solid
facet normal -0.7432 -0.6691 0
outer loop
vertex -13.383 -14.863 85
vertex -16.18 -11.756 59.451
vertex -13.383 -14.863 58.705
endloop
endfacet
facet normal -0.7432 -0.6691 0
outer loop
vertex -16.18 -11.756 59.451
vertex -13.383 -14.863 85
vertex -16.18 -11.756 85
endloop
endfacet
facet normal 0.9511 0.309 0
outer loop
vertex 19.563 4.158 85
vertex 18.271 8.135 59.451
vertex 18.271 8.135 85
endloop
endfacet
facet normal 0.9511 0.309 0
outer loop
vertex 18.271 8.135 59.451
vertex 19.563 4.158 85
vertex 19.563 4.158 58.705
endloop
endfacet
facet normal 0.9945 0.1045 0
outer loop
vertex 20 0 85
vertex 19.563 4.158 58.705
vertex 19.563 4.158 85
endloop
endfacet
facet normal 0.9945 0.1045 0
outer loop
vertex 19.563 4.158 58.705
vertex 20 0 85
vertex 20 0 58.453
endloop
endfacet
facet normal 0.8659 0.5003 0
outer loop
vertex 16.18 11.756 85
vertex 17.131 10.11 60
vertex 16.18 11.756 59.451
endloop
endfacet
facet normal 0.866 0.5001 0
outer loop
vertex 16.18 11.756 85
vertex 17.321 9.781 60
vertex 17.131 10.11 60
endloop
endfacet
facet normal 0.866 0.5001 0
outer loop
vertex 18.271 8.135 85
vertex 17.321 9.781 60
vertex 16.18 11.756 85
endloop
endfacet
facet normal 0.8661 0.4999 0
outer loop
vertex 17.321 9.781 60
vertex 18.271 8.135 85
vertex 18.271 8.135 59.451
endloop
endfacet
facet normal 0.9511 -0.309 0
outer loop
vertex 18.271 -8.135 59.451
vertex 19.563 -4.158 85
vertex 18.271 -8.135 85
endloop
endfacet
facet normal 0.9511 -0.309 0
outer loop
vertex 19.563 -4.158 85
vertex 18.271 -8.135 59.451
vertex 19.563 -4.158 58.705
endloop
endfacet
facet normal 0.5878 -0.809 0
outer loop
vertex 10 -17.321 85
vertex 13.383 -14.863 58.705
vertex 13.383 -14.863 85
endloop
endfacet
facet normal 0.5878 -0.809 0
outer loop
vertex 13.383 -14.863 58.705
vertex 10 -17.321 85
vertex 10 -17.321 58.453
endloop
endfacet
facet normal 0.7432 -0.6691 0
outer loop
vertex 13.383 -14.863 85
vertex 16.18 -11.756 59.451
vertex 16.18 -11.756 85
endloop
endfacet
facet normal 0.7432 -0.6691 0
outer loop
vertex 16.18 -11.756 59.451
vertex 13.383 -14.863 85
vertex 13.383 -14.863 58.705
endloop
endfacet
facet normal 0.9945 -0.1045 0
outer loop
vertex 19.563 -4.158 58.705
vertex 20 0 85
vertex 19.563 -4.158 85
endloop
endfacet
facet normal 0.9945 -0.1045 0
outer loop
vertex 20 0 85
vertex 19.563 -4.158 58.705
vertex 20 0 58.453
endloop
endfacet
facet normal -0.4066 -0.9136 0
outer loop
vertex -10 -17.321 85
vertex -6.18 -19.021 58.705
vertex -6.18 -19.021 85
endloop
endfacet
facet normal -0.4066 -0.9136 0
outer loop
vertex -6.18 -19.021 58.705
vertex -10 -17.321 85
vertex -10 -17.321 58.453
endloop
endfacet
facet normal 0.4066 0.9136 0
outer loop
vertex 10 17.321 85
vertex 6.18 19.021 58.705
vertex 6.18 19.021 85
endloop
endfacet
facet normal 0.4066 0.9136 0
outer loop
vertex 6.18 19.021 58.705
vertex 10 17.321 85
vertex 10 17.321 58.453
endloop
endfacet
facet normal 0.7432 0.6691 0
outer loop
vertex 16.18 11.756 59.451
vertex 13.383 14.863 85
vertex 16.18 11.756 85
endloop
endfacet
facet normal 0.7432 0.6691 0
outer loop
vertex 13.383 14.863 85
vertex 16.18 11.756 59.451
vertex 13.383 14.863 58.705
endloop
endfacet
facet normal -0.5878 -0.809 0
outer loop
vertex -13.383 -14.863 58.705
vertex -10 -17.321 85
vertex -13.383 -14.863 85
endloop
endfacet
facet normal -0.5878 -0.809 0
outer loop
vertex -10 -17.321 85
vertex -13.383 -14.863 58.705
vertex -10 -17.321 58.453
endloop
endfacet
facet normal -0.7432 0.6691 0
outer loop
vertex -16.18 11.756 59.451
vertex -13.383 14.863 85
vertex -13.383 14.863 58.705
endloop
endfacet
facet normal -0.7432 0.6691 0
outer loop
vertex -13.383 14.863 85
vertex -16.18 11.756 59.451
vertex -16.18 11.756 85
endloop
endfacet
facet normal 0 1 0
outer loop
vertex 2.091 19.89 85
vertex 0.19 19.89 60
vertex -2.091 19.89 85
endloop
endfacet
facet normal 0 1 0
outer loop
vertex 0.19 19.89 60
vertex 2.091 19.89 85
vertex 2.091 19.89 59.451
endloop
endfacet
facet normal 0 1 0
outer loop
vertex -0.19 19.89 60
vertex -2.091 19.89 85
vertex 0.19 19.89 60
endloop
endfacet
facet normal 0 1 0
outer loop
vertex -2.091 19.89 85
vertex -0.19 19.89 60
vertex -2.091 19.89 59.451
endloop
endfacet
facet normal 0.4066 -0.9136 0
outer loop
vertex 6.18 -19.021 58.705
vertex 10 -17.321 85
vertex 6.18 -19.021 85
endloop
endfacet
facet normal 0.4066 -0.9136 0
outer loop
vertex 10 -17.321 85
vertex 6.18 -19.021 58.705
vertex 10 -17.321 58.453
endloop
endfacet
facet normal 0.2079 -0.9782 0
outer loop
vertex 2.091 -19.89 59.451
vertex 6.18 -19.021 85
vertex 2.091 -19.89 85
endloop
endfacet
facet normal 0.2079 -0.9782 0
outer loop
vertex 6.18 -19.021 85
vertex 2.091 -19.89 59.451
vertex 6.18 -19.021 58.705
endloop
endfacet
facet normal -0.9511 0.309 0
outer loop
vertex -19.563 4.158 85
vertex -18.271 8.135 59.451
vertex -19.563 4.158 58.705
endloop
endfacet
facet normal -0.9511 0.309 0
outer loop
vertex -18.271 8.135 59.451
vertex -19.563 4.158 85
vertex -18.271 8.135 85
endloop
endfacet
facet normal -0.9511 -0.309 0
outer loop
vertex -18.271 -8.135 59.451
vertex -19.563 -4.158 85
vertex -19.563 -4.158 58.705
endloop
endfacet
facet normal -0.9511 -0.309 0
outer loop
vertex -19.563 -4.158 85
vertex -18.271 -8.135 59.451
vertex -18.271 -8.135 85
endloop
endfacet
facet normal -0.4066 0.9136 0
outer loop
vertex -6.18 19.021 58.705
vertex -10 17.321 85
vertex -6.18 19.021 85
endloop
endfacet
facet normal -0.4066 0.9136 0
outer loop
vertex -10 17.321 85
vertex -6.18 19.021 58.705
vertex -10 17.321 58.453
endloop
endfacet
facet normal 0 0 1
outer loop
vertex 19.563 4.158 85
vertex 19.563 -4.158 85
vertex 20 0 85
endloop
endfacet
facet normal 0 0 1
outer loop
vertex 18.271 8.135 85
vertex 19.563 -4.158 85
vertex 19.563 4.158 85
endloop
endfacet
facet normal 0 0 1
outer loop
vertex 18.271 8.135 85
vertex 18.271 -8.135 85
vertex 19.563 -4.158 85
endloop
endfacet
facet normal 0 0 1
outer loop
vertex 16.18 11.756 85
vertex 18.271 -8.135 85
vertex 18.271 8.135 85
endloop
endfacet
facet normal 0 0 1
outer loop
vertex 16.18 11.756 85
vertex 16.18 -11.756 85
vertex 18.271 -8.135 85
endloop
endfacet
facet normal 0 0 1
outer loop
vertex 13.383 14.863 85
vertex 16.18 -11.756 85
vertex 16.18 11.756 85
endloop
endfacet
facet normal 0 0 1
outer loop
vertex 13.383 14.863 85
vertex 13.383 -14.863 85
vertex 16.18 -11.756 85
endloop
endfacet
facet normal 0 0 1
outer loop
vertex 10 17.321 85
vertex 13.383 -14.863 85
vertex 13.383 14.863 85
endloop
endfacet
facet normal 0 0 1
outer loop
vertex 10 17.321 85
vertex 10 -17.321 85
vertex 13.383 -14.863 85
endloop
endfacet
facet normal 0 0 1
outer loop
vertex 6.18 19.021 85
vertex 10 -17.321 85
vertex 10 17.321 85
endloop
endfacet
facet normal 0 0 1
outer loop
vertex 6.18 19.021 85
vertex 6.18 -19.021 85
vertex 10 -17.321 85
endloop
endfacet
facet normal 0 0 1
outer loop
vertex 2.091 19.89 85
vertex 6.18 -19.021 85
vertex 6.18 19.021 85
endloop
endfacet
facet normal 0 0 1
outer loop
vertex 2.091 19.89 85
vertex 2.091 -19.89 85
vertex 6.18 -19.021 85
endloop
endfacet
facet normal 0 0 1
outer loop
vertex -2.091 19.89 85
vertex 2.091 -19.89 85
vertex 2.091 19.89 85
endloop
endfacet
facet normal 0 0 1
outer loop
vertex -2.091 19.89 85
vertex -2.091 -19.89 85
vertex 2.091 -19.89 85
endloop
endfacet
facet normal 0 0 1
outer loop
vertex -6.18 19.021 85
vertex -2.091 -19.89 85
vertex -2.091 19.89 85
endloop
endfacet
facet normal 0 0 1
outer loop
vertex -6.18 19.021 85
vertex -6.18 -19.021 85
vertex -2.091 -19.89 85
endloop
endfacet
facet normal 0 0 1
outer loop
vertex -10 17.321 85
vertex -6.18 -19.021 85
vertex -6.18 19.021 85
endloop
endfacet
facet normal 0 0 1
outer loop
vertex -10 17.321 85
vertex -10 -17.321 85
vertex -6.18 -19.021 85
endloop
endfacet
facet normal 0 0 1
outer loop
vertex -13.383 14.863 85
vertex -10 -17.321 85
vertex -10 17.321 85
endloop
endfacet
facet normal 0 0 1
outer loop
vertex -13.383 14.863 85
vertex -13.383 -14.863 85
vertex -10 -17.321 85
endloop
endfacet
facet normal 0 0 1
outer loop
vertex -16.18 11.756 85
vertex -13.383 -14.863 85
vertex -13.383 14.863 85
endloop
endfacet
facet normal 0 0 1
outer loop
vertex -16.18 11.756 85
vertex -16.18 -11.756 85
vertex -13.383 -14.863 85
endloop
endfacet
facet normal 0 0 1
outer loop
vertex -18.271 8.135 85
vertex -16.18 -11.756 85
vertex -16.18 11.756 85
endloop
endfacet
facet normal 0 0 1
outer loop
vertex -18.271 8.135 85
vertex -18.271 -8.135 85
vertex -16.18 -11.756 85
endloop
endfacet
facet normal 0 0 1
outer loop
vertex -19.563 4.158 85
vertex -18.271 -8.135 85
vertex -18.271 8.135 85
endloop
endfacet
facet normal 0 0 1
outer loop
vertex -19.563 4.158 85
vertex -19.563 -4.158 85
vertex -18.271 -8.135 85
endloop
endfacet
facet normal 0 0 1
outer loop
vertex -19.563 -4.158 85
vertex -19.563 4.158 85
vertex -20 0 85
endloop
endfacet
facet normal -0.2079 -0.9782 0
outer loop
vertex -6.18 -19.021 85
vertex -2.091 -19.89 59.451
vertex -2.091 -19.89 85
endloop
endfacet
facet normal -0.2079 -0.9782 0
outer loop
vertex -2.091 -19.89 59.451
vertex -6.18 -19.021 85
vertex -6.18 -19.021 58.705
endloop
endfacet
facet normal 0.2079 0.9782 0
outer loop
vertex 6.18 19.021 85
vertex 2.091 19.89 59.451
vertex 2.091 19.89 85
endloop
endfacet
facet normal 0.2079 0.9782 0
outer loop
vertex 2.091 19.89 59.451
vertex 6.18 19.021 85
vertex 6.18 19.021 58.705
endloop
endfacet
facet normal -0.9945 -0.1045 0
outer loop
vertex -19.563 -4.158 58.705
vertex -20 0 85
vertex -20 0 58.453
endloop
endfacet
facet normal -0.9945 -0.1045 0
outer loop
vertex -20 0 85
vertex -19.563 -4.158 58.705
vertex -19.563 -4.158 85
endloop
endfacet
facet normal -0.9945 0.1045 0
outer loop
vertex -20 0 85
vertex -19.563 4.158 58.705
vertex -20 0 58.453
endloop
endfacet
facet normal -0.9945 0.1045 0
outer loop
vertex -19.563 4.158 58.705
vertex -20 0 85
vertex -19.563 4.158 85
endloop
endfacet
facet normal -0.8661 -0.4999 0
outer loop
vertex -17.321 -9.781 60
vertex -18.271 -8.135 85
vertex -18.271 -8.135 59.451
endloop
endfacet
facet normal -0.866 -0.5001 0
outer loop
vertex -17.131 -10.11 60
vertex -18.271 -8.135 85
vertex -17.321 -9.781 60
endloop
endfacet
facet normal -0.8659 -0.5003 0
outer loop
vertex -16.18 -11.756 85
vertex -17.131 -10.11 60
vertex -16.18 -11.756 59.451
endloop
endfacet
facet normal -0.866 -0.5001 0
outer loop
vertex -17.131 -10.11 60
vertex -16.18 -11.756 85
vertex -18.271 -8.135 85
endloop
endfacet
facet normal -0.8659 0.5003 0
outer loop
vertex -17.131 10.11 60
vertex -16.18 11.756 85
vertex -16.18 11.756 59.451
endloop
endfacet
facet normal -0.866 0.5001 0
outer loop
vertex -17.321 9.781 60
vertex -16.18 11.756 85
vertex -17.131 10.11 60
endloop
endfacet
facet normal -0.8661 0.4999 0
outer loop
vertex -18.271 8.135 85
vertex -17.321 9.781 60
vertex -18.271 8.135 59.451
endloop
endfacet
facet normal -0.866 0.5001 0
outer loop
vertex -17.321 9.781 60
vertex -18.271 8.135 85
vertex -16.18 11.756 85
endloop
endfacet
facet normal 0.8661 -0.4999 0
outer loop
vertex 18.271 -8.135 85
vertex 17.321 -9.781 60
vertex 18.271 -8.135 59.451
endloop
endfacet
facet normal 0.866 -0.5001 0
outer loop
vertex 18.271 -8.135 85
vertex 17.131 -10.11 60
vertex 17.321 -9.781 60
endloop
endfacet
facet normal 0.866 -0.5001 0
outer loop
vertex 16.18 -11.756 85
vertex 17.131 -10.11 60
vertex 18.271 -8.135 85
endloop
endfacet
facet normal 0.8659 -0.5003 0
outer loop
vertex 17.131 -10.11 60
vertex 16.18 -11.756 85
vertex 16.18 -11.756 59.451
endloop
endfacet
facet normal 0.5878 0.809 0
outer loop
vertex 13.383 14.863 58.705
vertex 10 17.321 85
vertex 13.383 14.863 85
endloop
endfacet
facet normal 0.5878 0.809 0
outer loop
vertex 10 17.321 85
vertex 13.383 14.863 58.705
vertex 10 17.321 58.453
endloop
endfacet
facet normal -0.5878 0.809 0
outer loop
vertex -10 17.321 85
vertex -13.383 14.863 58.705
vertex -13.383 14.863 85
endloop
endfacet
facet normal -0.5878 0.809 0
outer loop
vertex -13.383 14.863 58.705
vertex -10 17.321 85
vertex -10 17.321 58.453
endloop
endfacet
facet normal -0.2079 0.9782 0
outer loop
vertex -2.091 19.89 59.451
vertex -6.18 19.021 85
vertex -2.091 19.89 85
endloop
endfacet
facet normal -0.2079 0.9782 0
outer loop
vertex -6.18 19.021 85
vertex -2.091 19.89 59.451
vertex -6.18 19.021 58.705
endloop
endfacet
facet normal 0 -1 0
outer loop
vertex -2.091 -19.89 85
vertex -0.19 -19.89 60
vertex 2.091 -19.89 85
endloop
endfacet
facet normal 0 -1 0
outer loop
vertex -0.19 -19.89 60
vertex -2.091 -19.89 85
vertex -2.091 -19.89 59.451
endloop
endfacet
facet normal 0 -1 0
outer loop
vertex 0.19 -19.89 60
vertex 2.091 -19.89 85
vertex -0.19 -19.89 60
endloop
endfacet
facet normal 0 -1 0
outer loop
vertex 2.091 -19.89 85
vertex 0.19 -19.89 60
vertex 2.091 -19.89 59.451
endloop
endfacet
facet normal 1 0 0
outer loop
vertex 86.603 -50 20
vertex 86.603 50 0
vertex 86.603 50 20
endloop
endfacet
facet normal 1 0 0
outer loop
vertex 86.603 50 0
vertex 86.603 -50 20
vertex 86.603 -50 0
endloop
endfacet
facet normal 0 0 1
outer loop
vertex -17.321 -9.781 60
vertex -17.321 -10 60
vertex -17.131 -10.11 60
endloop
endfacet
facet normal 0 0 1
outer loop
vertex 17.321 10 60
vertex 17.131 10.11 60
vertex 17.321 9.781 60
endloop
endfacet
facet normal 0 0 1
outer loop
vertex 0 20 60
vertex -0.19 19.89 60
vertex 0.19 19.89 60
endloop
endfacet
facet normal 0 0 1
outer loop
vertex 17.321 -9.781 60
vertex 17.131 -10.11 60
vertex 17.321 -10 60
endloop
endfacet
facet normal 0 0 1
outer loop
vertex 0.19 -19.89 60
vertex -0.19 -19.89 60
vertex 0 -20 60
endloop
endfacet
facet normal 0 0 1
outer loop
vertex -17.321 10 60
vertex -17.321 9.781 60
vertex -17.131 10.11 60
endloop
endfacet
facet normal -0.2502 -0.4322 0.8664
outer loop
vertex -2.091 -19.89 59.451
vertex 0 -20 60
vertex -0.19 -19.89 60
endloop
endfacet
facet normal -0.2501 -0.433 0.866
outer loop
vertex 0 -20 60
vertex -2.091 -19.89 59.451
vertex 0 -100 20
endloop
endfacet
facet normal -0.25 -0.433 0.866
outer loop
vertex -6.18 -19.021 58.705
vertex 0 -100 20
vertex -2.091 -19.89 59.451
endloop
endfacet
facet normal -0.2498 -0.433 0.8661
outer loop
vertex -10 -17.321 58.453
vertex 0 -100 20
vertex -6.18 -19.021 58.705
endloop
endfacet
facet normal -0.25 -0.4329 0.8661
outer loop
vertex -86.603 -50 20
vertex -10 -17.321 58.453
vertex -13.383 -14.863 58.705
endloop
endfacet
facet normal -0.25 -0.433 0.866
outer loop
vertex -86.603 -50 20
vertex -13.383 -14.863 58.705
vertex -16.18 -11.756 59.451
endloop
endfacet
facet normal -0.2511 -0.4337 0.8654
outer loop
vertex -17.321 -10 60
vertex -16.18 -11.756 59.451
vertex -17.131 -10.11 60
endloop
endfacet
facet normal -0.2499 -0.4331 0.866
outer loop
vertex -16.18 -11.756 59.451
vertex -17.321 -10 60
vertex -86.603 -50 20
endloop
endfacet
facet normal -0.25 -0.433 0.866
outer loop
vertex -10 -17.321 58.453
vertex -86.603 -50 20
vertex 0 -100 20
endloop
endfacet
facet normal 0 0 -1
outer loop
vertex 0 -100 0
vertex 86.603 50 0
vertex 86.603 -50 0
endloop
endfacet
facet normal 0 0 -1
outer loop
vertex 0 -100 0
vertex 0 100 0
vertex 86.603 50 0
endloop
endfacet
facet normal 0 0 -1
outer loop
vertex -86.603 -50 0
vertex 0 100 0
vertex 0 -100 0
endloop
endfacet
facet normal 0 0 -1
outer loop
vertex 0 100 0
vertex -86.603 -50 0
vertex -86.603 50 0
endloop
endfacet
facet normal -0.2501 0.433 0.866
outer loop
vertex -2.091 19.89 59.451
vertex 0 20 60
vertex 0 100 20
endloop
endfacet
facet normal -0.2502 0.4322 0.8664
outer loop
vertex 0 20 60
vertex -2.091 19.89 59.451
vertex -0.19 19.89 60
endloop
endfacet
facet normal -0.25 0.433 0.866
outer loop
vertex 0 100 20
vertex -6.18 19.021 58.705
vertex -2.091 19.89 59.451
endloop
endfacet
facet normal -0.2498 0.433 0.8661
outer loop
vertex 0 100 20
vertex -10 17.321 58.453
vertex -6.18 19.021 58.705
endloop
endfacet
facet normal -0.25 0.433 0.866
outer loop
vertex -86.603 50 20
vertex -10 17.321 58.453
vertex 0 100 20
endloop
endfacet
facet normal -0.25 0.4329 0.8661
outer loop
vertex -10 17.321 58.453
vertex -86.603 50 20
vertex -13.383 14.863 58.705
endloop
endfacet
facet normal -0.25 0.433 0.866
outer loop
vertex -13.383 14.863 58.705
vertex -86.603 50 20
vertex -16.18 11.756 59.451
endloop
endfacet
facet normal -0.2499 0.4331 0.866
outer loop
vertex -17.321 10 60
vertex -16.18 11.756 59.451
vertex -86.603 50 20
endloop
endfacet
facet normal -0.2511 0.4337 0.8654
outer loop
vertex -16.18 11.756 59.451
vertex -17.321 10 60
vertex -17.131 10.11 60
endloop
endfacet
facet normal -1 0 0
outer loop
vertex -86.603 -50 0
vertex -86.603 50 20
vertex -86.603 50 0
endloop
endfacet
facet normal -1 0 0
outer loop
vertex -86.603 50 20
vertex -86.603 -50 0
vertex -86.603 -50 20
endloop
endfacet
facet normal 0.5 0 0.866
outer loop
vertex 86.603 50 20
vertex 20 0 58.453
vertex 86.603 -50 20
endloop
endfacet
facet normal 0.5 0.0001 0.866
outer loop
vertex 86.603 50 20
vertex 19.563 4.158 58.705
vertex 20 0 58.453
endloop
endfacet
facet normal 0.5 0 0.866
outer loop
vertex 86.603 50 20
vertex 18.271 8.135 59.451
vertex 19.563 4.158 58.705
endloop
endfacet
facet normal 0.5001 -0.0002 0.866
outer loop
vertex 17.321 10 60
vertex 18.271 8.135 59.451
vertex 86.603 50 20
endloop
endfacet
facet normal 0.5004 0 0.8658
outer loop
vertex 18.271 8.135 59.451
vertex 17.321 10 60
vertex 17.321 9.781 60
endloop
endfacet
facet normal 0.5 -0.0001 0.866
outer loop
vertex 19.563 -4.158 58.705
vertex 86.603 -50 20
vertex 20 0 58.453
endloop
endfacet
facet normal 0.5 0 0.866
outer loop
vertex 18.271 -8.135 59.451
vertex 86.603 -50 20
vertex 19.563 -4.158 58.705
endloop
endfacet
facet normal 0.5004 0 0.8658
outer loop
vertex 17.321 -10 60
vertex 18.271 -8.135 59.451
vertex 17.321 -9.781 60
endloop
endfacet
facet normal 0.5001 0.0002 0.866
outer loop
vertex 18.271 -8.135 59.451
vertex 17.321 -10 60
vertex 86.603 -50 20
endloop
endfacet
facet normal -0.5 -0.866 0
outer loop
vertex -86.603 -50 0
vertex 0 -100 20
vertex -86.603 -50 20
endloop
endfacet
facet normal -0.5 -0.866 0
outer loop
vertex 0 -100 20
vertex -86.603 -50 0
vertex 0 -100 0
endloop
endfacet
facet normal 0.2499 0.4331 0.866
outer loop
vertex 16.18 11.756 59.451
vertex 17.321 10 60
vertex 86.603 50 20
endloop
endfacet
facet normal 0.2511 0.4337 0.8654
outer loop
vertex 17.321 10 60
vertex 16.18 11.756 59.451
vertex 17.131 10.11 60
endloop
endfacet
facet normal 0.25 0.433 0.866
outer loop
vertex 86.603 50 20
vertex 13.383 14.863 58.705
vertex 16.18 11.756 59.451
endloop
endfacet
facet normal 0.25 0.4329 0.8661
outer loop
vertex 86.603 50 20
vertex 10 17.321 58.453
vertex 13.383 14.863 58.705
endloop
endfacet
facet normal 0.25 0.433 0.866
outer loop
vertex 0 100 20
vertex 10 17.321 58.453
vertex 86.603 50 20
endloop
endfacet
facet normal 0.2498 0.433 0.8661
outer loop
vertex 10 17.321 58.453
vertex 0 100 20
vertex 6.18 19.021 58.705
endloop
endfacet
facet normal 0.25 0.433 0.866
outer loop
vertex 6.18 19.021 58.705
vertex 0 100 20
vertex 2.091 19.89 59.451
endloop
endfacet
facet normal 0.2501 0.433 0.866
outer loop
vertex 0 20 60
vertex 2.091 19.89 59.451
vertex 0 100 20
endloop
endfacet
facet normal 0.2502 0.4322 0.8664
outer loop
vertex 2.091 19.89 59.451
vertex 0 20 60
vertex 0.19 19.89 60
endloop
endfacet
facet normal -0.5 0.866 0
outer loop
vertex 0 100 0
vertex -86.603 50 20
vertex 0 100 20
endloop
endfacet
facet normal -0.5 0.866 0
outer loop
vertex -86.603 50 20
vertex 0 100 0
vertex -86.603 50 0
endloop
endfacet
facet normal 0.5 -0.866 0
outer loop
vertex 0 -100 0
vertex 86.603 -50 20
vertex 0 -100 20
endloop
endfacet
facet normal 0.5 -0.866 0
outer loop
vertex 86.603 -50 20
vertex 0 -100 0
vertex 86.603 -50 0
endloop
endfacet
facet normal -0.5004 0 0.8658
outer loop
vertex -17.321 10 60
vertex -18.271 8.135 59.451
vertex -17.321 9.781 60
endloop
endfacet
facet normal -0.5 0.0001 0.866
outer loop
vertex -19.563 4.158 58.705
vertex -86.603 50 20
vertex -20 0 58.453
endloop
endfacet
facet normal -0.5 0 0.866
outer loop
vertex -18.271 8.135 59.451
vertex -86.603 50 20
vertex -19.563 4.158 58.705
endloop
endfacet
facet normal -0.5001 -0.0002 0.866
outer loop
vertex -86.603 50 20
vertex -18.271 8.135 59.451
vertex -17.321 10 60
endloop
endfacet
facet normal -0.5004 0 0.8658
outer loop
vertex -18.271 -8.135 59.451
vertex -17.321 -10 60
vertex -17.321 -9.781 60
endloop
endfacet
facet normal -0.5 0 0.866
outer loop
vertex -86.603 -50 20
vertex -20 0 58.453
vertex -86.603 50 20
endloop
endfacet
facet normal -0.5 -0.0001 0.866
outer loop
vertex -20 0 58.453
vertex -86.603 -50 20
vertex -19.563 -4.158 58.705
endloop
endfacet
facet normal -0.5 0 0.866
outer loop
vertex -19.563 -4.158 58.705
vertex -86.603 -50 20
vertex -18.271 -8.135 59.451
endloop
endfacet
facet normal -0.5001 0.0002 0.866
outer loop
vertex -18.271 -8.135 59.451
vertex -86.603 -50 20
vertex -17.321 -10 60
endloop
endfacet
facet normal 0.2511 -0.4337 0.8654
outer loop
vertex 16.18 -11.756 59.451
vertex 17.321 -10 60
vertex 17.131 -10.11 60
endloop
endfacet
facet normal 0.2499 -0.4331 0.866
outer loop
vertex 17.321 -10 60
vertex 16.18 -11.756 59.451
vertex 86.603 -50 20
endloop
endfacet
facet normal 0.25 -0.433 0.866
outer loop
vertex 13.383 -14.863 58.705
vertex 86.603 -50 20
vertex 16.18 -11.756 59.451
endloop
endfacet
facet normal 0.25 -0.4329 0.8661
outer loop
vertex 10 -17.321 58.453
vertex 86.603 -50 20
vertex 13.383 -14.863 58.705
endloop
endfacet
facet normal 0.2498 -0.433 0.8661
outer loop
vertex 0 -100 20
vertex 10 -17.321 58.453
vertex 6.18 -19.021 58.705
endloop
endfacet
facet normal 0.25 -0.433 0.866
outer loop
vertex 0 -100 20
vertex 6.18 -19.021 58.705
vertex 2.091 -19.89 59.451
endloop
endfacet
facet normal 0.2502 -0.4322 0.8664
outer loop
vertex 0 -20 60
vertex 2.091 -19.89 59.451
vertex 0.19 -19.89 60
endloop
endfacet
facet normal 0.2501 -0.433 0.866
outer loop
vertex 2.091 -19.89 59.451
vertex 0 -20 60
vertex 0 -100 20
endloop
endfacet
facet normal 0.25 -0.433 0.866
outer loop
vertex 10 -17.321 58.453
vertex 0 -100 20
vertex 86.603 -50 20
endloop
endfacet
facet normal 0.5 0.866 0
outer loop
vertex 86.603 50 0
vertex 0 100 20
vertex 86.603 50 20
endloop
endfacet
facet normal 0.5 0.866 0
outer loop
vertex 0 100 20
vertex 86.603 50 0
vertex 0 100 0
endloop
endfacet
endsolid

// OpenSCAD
/*
hull(){
    
     
    polygon(points=[[0,50],[-43,25],[-43,-25],[0,-50],[43,-25],[43,25]]);
}
;
*/
/*
module xexagon_base_large(){
    linear_extrude(20) scale(2) polygon(points=[[0,50],[-43,25],[-43,-25],[0,-50],[43,-25],[43,25]]);
}
;

module xexagon_base_small(){
    translate([0,0,60])
    linear_extrude(10) 
    scale(0.2) 
    polygon(points=[[0,50],[-43,25],[-43,-25],[0,-50],[43,-25],[43,25]], convexity = 1);
}
;
hull(){
    xexagon_base_large();
    xexagon_base_small();
}
;

translate([0,0,70])
cylinder(h = 30, r1 = 20, r2 = 20, center = true);
*/



module base_xexagon(r=100, $fn=6){
    linear_extrude(20) rotate([0,0,90]) circle(r, $fn);   
}
;


translate([0,0,70])
cylinder(h = 30, r1 = 20, r2 = 20, center = true);


module base_extruded(){
    hull(){
        base_xexagon(r=100, $fn=6);
        translate([0,0,40]) base_xexagon(r=20, $fn=6);
    }
}
;
//difference(){
base_extruded();

//};
//translate([0,0,0]) sphere(10);
